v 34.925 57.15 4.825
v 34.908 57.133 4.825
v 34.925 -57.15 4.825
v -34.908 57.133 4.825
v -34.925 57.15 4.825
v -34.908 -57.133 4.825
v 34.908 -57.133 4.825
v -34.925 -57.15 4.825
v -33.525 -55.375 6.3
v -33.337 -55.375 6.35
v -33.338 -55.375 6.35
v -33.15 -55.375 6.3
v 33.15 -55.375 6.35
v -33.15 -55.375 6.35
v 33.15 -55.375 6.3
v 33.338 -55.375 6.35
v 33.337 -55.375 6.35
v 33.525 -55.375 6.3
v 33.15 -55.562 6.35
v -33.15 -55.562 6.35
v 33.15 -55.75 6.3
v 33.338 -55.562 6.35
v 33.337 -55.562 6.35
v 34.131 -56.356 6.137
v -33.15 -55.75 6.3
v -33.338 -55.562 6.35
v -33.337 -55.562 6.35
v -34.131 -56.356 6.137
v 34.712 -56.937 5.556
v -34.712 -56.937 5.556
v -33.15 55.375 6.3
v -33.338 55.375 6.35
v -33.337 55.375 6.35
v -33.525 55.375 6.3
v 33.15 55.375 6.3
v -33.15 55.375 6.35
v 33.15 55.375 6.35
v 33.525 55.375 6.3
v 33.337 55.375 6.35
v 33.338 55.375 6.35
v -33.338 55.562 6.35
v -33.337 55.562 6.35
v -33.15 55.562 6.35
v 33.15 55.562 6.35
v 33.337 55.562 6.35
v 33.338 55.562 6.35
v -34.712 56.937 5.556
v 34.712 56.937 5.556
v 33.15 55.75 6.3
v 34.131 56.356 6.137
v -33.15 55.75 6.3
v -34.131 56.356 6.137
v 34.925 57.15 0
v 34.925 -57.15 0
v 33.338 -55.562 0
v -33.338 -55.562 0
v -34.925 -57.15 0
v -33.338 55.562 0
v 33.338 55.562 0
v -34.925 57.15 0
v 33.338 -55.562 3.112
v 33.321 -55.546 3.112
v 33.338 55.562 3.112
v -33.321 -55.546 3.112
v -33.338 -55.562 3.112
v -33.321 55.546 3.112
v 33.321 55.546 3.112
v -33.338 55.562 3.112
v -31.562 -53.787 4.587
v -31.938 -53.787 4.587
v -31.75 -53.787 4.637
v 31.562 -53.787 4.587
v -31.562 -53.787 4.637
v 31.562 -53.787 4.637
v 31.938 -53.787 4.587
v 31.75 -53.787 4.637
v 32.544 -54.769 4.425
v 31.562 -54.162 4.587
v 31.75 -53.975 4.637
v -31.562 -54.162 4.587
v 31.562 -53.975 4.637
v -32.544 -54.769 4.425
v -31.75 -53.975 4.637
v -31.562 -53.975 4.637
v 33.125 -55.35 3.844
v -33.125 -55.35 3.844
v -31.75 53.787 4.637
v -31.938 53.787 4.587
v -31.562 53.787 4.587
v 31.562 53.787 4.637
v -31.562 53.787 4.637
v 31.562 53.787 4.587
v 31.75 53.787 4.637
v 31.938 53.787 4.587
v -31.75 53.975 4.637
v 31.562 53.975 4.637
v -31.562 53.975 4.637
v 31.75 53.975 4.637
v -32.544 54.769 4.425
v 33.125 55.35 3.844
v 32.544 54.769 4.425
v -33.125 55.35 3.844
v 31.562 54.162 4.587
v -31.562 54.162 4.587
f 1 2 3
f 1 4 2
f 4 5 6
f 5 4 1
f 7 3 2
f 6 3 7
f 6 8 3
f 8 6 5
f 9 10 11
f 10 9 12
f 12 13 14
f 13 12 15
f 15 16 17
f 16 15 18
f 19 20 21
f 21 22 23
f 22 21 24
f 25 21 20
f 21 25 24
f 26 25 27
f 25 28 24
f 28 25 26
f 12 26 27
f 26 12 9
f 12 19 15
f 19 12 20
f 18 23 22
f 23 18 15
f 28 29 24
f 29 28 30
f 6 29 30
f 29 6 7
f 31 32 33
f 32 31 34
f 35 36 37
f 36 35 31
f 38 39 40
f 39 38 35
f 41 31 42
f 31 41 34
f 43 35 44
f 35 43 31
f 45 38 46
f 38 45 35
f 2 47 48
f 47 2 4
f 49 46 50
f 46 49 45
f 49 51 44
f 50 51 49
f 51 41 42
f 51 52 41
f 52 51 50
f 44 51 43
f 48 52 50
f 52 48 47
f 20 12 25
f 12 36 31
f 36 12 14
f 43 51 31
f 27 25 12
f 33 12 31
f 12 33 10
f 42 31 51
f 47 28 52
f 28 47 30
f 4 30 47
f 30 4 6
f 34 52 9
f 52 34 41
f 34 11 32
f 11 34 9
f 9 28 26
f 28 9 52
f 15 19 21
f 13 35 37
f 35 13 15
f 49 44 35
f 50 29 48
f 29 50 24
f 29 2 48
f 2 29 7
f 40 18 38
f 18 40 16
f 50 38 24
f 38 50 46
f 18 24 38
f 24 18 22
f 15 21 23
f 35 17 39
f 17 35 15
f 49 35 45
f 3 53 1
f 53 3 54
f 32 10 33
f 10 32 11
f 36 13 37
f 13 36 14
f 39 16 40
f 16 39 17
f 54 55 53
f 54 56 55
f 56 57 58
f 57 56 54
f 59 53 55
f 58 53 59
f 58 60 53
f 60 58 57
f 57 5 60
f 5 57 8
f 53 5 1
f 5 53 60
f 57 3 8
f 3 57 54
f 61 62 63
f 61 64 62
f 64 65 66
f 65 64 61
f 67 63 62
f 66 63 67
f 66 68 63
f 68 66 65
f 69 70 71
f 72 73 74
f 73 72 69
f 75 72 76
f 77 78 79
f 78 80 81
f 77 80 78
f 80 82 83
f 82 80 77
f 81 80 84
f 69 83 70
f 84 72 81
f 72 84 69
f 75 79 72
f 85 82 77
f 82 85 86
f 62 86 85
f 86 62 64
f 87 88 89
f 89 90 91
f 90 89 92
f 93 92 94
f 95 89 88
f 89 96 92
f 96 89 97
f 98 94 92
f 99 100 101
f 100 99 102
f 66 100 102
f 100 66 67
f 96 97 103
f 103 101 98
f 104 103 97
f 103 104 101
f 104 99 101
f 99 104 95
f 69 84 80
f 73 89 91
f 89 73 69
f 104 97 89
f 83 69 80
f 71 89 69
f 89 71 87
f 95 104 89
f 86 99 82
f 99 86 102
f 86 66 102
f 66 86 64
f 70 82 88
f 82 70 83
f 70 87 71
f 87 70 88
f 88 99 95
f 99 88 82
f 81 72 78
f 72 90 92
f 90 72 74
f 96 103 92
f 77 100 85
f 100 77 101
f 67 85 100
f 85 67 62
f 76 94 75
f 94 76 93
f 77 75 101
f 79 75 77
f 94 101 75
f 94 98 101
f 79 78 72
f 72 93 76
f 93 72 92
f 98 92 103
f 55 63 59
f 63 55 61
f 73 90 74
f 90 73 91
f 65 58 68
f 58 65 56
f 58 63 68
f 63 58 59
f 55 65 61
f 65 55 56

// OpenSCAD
joinfactor = 0.125;
goldenratio = 1.61803399;

gThickness = 1/4 * 25.4;
gRoundingRadius = 1/8/2*25.4;

gStandardWidth = 2.75*25.4;
gStandardHeight = 4.5 * 25.4;

gFixtureHoleDistance = 2.375*25.4;		// The separation between holes when a fixture is being covered
gFixtureHoleIR =5/32/2*25.4;
gFixtureHoleOR = 6.75/2;

gLightSwitchHeight = 0.942*25.4;		// The height of a light switch
gLightSwitchWidth = 0.406 * 25.4;		// The width of a light switch

//
// Examples
//
//roundedplate(gStandardWidth, gStandardHeight, gThickness);
hollowplate(gStandardWidth, gStandardHeight, gThickness, 1/16*25.4);

//Switch();

//Switch_1gang(gStandardWidth, gStandardHeight, gThickness);



//===============================
// Modules
//===============================
module roundedplate(width, height, thickness)
{
	smooth = 12;

	difference()
	{
		cube([width, height, thickness], center=true);

		translate([0, -height/2+gRoundingRadius, thickness/2-gRoundingRadius])
		{
			difference()
			{
				translate([0, -gRoundingRadius+joinfactor, gRoundingRadius+joinfactor])
				cube([width+joinfactor*2, gRoundingRadius*2+joinfactor, gRoundingRadius*2+joinfactor], center=true);

				rotate([0, 90, 0])
				cylinder(r=gRoundingRadius, h=width+4*joinfactor, center=true, $fn=smooth);
			}
		}

		translate([0, height/2-gRoundingRadius, thickness/2-gRoundingRadius])
		{
			difference()
			{
				translate([0, gRoundingRadius-joinfactor, gRoundingRadius+joinfactor])
				cube([width+joinfactor*2, gRoundingRadius*2+joinfactor, gRoundingRadius*2+joinfactor], center=true);

				rotate([0, 90, 0])
				cylinder(r=gRoundingRadius, h=width+4*joinfactor, center=true, $fn=smooth);
			}
		}


		// Negative X along Y
		translate([-width/2+gRoundingRadius, 0, thickness/2-gRoundingRadius])
		{
			difference()
			{
				translate([-gRoundingRadius+joinfactor, 0, gRoundingRadius+joinfactor])
				cube([gRoundingRadius*2+joinfactor, height+joinfactor*2, gRoundingRadius*2+joinfactor], center=true);

				rotate([90, 0, 0])
				cylinder(r=gRoundingRadius, h=height+4*joinfactor, center=true, $fn=smooth);
			}
		}

		// Positive X along Y
		translate([width/2-gRoundingRadius, 0, thickness/2-gRoundingRadius])
		{
			difference()
			{
				translate([gRoundingRadius-joinfactor, 0, gRoundingRadius+joinfactor])
				cube([gRoundingRadius*2+joinfactor, height+joinfactor*2, gRoundingRadius*2+joinfactor], center=true);

				rotate([90, 0, 0])
				cylinder(r=gRoundingRadius, h=height+4*joinfactor, center=true, $fn=smooth);
			}
		}
	}
}

module hollowplate(width, height, thickness, wallthickness)
{
	hollowthickness = thickness-wallthickness;

	difference()
	{
		translate([0,0,thickness/2])
		roundedplate(width, height, thickness);
		
		translate([0,0,hollowthickness/2-joinfactor])
		roundedplate(width-wallthickness*2, height-wallthickness*2, hollowthickness);
	}
}

module Switch()
{
	union()
	{
		cube(size=[gLightSwitchWidth, gLightSwitchHeight, gThickness+2*joinfactor], center=true);

		translate([0, gFixtureHoleDistance/2, 0])
		cylinder(r=gFixtureHoleIR, h=gThickness+2*joinfactor, center=true, $fn = 12);

		translate([0, gFixtureHoleDistance/2, 0])
		cylinder(r1=gFixtureHoleIR, r2=gFixtureHoleOR, h=gThickness/2+joinfactor, $fn = 12);

		translate([0, -gFixtureHoleDistance/2, 0])
		cylinder(r=gFixtureHoleIR, h=gThickness+2*joinfactor, center=true, $fn = 12);

		translate([0, -gFixtureHoleDistance/2, 0])
		cylinder(r1=gFixtureHoleIR, r2=gFixtureHoleOR, h=gThickness/2+joinfactor, $fn = 12);
	}	
}


module Switch_1gang(width, height, thickness)
{
	difference()
	{
		roundedplate(width, height, thickness);
	
		Switch();
	}
}
